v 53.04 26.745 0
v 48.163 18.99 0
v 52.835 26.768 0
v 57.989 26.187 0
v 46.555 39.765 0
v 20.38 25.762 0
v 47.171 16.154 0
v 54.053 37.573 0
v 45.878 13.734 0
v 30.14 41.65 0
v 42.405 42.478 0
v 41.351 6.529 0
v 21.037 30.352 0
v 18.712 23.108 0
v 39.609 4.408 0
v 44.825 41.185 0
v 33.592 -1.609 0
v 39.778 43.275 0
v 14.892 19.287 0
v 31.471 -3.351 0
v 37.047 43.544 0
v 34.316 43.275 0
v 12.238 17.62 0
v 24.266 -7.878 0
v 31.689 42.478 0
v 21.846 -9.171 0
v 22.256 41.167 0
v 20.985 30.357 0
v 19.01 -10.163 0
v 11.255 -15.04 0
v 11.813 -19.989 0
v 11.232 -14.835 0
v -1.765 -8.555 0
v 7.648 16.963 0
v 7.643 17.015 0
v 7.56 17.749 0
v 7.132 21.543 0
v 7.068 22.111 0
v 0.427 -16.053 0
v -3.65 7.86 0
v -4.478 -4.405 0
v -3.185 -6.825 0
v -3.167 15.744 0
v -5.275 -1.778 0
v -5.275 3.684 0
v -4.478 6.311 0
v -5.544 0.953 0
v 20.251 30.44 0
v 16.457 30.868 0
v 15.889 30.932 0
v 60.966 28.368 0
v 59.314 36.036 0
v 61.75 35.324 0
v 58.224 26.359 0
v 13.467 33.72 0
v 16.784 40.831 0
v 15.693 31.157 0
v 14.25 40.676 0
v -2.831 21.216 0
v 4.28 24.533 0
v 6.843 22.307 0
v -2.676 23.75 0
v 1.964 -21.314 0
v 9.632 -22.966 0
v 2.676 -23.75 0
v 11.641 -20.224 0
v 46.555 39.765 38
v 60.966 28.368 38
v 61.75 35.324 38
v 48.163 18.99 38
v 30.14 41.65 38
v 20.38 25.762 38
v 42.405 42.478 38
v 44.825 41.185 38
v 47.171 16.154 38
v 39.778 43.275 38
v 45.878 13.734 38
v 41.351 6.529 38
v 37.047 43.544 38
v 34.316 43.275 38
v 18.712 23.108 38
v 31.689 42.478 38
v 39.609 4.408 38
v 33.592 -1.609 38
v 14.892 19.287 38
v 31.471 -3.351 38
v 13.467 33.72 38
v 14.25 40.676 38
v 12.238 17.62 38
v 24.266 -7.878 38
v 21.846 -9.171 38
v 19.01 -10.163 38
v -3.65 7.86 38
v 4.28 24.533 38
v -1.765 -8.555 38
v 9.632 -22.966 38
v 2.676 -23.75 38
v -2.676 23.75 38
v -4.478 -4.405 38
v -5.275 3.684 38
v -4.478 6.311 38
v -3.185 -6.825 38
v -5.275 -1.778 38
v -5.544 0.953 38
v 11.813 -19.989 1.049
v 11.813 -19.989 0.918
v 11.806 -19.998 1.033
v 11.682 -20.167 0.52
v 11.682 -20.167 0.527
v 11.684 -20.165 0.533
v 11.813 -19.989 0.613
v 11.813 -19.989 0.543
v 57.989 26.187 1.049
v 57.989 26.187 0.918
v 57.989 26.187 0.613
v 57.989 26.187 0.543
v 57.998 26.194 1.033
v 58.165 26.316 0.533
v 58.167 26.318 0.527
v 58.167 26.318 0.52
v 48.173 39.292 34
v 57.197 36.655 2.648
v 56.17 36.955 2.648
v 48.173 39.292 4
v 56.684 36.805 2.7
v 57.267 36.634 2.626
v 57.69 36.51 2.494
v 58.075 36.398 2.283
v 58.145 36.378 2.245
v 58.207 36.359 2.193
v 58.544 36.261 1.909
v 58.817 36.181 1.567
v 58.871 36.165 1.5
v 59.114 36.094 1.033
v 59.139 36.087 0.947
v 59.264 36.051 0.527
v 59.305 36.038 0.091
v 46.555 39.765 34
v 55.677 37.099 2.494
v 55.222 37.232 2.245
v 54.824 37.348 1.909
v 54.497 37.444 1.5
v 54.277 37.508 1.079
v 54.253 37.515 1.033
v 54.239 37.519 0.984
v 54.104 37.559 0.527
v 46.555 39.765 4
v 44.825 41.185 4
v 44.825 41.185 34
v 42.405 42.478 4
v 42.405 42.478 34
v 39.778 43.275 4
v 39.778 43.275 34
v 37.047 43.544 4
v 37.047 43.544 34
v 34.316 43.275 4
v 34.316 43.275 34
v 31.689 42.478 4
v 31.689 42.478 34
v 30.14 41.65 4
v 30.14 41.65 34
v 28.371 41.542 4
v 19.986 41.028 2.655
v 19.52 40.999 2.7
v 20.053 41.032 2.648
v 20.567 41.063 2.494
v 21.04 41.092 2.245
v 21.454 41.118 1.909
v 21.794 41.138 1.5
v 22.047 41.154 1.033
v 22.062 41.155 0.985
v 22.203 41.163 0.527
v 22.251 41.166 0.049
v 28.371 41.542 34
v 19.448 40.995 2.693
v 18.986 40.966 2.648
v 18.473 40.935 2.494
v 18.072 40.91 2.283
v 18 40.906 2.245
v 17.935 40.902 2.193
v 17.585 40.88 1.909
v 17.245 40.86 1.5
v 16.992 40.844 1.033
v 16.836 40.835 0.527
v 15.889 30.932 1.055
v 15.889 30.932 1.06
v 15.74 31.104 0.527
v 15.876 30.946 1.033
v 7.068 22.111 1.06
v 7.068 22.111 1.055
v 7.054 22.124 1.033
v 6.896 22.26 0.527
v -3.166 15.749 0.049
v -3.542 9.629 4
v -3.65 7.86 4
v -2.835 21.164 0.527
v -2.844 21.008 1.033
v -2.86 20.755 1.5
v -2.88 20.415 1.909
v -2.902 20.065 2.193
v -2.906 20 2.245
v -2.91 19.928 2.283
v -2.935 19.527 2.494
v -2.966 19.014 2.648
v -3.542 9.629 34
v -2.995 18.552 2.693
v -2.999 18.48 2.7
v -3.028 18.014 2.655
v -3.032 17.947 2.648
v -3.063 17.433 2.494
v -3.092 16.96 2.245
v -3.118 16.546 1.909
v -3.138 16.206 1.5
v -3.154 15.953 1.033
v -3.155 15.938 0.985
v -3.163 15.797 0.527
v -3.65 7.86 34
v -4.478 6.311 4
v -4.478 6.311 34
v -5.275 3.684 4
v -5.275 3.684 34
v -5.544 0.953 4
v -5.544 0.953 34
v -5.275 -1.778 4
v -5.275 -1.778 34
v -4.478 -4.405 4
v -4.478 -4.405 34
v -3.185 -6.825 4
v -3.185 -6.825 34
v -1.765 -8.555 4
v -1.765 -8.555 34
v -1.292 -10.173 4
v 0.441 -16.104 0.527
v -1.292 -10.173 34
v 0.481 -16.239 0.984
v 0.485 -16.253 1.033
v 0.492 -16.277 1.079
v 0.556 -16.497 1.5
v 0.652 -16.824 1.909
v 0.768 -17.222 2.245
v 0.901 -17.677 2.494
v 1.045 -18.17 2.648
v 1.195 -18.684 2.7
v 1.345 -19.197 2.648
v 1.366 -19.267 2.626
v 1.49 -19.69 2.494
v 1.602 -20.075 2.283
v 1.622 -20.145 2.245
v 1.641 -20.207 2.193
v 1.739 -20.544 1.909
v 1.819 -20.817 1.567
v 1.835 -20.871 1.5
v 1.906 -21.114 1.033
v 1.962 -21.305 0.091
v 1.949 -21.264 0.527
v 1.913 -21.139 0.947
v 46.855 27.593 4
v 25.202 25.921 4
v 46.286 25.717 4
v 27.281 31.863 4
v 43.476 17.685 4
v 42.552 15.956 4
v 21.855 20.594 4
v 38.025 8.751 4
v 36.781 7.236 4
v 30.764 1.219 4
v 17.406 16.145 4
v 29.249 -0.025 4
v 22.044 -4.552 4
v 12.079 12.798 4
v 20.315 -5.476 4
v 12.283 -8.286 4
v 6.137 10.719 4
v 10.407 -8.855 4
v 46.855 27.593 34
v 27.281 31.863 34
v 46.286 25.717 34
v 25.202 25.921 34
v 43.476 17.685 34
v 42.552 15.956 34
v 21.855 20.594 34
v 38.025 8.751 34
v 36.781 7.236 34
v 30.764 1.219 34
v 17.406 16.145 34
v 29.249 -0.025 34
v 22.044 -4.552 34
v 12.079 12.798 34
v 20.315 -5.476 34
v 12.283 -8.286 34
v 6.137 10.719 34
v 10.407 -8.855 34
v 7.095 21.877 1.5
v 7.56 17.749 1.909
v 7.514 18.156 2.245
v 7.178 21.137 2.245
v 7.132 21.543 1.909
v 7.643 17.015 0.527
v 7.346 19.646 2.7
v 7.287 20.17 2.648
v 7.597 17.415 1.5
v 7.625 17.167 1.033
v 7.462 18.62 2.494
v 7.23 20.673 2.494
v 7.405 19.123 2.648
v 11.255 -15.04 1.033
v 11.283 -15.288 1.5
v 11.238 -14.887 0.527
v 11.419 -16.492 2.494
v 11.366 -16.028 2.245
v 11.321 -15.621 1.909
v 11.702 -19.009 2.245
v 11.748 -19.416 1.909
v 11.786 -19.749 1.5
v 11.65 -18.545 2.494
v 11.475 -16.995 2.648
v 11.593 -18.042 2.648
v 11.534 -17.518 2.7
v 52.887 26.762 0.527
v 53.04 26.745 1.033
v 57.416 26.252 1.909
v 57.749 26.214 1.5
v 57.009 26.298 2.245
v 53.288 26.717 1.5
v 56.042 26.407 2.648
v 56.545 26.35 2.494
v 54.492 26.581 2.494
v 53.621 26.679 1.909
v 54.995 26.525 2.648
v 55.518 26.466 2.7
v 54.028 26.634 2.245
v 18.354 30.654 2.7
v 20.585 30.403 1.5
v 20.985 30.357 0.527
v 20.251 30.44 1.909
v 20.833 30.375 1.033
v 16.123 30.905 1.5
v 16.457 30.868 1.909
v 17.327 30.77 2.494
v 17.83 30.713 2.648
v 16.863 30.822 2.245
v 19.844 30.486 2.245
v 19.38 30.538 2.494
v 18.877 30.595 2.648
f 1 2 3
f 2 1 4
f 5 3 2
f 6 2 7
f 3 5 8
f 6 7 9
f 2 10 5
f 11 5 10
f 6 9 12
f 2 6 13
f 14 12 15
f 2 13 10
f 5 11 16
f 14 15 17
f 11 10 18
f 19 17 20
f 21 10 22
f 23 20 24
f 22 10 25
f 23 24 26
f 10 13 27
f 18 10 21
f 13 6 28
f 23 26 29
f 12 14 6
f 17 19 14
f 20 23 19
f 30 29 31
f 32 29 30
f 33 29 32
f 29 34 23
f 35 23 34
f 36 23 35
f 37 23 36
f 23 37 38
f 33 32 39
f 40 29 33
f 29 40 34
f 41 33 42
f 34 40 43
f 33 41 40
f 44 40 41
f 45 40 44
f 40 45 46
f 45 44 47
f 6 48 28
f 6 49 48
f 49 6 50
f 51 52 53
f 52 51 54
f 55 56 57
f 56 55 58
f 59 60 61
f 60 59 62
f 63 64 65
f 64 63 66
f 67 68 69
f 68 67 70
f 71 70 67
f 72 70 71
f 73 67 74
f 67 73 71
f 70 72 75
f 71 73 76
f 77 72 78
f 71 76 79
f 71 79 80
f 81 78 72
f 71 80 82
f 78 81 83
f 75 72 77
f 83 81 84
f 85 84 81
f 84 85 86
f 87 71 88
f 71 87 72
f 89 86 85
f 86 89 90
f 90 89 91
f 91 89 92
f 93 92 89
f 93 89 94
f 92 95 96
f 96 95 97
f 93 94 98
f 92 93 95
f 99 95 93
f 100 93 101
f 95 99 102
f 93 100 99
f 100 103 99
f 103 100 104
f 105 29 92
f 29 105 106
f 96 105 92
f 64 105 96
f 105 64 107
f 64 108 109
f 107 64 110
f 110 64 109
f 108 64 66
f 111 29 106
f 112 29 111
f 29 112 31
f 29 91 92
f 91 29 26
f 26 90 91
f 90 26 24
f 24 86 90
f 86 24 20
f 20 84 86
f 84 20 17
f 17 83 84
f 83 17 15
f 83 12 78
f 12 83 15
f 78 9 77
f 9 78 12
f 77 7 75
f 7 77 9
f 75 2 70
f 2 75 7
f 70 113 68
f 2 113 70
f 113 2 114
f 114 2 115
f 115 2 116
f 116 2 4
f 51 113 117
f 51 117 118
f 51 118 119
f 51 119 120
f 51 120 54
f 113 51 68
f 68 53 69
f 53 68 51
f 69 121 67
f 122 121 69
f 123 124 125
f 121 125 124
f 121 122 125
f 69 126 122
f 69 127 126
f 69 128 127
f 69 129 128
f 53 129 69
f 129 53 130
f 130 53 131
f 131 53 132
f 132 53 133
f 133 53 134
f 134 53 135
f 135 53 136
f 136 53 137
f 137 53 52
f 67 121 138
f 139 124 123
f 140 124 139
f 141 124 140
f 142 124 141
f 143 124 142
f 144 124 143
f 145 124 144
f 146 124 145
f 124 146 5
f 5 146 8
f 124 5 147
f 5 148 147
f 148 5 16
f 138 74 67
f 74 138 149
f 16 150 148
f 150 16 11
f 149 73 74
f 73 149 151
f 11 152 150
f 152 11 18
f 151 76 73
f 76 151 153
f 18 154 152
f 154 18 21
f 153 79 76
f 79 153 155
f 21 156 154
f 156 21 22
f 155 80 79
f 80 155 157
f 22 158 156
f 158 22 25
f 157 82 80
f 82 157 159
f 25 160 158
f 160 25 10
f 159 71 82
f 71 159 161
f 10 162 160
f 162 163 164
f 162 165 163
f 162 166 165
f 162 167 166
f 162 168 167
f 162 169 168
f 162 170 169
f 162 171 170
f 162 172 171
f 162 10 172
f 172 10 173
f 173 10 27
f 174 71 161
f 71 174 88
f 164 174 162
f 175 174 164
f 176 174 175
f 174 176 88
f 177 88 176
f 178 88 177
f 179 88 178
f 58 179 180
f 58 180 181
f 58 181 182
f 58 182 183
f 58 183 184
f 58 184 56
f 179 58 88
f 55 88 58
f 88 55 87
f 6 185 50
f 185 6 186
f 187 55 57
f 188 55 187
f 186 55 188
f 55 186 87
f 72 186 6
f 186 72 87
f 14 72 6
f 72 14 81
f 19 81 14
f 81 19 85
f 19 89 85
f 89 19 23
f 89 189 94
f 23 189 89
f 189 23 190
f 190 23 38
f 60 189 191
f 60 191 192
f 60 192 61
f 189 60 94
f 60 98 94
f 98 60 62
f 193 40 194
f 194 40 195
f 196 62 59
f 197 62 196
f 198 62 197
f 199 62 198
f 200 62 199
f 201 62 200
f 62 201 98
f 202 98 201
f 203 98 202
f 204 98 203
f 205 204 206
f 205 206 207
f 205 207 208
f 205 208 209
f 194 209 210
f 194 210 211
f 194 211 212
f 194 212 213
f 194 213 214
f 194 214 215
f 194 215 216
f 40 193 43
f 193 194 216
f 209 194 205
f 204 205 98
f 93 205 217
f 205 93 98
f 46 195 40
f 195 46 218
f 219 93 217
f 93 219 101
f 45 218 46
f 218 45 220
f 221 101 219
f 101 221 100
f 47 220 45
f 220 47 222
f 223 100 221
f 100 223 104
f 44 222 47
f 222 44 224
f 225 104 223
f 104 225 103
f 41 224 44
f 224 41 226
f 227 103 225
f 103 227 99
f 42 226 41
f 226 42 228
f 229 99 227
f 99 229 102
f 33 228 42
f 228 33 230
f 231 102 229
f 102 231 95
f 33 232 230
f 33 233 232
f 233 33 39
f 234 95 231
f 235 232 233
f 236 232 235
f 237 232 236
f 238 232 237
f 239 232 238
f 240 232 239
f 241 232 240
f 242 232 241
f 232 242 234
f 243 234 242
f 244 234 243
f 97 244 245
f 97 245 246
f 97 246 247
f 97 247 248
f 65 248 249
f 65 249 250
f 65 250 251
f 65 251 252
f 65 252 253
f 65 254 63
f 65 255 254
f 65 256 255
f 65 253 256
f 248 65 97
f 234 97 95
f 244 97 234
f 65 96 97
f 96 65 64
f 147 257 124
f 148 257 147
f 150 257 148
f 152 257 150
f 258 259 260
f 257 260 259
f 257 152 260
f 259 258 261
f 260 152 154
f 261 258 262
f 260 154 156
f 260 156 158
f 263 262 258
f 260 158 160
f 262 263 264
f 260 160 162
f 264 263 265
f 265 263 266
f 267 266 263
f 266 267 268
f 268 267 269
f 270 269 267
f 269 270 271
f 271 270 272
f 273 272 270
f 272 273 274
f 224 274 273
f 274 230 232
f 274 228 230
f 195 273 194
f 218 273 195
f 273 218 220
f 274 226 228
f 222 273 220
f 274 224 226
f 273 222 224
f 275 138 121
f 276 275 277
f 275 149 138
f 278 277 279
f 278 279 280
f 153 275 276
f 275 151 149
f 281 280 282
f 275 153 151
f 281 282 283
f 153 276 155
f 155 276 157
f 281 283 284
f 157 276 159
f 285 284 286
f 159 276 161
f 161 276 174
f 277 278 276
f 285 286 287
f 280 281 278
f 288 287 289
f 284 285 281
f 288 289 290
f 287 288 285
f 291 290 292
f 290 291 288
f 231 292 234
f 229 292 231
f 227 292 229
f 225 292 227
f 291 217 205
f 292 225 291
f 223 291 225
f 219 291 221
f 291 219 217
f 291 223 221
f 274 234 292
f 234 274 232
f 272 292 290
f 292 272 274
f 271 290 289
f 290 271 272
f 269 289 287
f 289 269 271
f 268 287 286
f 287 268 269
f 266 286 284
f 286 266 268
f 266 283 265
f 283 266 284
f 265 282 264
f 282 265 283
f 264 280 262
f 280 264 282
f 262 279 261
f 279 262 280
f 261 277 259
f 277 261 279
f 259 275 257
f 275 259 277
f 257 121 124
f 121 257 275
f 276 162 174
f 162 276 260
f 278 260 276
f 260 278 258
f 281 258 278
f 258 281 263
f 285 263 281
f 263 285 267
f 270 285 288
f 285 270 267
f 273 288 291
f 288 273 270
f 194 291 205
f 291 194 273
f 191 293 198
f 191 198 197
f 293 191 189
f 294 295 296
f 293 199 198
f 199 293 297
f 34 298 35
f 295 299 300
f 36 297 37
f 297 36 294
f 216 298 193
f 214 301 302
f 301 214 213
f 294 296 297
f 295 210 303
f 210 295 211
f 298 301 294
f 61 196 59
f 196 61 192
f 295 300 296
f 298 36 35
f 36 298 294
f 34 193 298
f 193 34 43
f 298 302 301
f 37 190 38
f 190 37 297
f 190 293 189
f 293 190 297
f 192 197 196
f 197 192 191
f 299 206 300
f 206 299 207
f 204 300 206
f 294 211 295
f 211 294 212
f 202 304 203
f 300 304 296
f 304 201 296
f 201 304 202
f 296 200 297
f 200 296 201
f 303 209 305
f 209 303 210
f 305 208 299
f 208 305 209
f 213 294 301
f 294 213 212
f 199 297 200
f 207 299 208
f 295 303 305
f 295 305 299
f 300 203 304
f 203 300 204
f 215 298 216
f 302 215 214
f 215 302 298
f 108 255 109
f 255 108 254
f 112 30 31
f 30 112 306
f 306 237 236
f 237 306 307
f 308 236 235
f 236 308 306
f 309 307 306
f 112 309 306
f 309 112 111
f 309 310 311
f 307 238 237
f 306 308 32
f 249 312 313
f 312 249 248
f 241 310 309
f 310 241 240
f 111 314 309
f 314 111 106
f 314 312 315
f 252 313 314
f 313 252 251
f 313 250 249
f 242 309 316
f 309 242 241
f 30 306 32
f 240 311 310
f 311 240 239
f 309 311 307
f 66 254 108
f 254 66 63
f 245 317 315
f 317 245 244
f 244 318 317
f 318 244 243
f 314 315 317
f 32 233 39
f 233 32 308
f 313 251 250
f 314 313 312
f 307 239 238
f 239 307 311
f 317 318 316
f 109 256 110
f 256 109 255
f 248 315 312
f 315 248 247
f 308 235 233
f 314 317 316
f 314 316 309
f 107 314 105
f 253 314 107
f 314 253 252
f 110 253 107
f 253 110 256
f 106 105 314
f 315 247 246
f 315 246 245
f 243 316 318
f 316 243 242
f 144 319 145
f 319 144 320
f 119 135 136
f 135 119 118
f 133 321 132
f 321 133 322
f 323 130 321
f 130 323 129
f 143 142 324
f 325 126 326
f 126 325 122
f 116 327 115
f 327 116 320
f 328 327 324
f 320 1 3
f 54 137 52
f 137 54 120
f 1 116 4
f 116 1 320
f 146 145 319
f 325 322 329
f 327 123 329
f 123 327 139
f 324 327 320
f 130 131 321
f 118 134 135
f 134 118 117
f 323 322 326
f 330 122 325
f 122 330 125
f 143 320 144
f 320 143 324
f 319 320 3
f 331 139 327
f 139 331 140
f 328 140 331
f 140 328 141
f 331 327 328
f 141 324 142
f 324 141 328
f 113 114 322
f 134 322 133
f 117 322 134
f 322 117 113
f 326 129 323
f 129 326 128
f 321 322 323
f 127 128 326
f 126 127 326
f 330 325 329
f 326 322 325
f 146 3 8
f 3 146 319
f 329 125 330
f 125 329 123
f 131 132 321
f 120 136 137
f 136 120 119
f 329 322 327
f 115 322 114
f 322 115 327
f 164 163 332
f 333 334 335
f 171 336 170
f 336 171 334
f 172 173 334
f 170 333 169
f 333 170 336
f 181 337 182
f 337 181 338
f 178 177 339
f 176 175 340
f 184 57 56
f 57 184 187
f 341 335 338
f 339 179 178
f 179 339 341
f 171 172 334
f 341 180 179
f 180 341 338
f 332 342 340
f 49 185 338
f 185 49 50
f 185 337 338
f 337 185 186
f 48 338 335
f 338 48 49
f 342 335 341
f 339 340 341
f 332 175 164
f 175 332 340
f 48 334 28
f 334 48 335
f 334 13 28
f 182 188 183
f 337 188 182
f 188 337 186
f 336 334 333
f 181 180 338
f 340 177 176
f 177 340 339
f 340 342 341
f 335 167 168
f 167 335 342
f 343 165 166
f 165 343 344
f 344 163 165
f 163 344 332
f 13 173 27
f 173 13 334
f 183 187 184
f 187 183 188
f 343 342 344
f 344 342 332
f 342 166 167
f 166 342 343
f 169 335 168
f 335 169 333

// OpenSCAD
$fn = 32;

// ----------------------------------------------------------------------
// Air duct: 28 mm duct, 4 mm wall, 38 mm across
// ----------------------------------------------------------------------

// --- parameters (mm) ---
duct_r = 14;              // duct core radius
duct_d = 28;              // duct core diameter
wall = 4;                 // duct wall thickness
height = 38;              // duct width (extrusion height)
port_r = 23.9;            // port flange half width
port_d = 47.8;            // port flange width
port_t = 7;               // port flange thickness
bolt_d = 5.4;             // port bolt holes
bolt_offset = 18.7;       // bolt hole offset from the port axis

difference() {
  /* outer hull chain: tube with a flat flange plate at every port */
  linear_extrude(height = 38) {
    hull() {
      polygon([[2.676, -23.75], [-2.676, 23.75], [4.28, 24.533], [9.632, -22.966]]);
      translate([9.937, 1.12]) circle(r = 14);
    }
    hull() {
      translate([9.937, 1.12]) circle(r = 14);
      translate([8.456, 0.953]) circle(r = 14);
    }
    hull() {
      translate([8.456, 0.953]) circle(r = 14);
      translate([16.488, 3.763]) circle(r = 14);
    }
    hull() {
      translate([16.488, 3.763]) circle(r = 14);
      translate([23.693, 8.29]) circle(r = 14);
    }
    hull() {
      translate([23.693, 8.29]) circle(r = 14);
      translate([29.71, 14.307]) circle(r = 14);
    }
    hull() {
      translate([29.71, 14.307]) circle(r = 14);
      translate([34.237, 21.512]) circle(r = 14);
    }
    hull() {
      translate([34.237, 21.512]) circle(r = 14);
      translate([37.047, 29.544]) circle(r = 14);
    }
    hull() {
      translate([37.047, 29.544]) circle(r = 14);
      translate([36.88, 28.063]) circle(r = 14);
    }
    hull() {
      translate([36.88, 28.063]) circle(r = 14);
      polygon([[14.25, 40.676], [61.75, 35.324], [60.966, 28.368], [13.467, 33.72]]);
    }
  }
  /* air passage: the same chain inset by the wall, 5 mm proud of the ports */
  translate([0, 0, 4]) linear_extrude(height = 30) {
    hull() {
      translate([-4.969, -0.56]) circle(r = 10);
      translate([8.456, 0.953]) circle(r = 10);
    }
    hull() {
      translate([8.456, 0.953]) circle(r = 10);
      translate([16.488, 3.763]) circle(r = 10);
    }
    hull() {
      translate([16.488, 3.763]) circle(r = 10);
      translate([23.693, 8.29]) circle(r = 10);
    }
    hull() {
      translate([23.693, 8.29]) circle(r = 10);
      translate([29.71, 14.307]) circle(r = 10);
    }
    hull() {
      translate([29.71, 14.307]) circle(r = 10);
      translate([34.237, 21.512]) circle(r = 10);
    }
    hull() {
      translate([34.237, 21.512]) circle(r = 10);
      translate([37.047, 29.544]) circle(r = 10);
    }
    hull() {
      translate([37.047, 29.544]) circle(r = 10);
      translate([38.56, 42.969]) circle(r = 10);
    }
  }
  translate([0, 0]) rotate([0, 0, -83.57]) translate([-18.7, -2.5]) rotate([-90, 0, 0]) cylinder(h = 12, d = 5.4);
  translate([0, 0]) rotate([0, 0, -83.57]) translate([18.7, -2.5]) rotate([-90, 0, 0]) cylinder(h = 12, d = 5.4);
  translate([38, 38]) rotate([0, 0, 173.57]) translate([-18.7, -2.5]) rotate([-90, 0, 0]) cylinder(h = 12, d = 5.4);
  translate([38, 38]) rotate([0, 0, 173.57]) translate([18.7, -2.5]) rotate([-90, 0, 0]) cylinder(h = 12, d = 5.4);
}
